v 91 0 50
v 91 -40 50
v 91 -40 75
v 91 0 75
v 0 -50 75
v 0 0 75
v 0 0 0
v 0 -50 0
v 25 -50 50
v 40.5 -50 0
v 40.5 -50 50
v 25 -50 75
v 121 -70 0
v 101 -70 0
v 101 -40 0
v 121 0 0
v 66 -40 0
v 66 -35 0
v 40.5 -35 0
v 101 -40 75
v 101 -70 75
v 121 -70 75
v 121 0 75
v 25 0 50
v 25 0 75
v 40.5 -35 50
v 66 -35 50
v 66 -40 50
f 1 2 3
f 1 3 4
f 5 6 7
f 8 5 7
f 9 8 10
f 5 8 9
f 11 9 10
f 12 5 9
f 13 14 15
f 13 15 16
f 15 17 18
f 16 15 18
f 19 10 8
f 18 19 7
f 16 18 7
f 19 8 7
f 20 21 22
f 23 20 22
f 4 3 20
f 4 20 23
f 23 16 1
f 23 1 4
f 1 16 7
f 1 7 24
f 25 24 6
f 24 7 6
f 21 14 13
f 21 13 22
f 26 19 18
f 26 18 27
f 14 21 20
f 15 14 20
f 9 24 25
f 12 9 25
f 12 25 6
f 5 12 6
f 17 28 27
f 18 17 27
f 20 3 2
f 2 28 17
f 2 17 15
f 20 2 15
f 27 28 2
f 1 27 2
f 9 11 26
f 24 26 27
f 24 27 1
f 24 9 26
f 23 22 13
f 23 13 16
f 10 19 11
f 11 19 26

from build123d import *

# Parameters (mm, degrees)
F1_DEPTH = 50
F2_W     = 35
F2_H     = 50
F3_DEPTH = 25.5
F4_W     = 40
F4_H     = 50
F5_DEPTH = 35
F6_W     = 10
F6_H     = 40
F7_DEPTH = 25
F8_W     = 70
F8_H     = 75
F9_DEPTH = 20


with BuildPart() as f1:
    # F0 (on Front) → F1 (new body)
    with BuildSketch(Plane.XZ):
        Polygon((0, 75), (0, 0), (40.5, 0), (40.5, 50), (25, 50), (25, 75), align=None)
    extrude(amount=F1_DEPTH)

    # F2 (on face) → F3 (join)
    with BuildSketch(Plane.YZ.offset(40.5)):
        with Locations((-17.5, 25)):
            Rectangle(F2_W, F2_H)
    extrude(amount=F3_DEPTH)

    # F4 (on face) → F5 (join)
    with BuildSketch(Plane.YZ.offset(66)):
        with Locations((-20, 25)):
            Rectangle(F4_W, F4_H)
    extrude(amount=F5_DEPTH)

    # F6 (on face) → F7 (join)
    with BuildSketch(Plane.XY.offset(50)):
        with Locations((96, -20)):
            Rectangle(F6_W, F6_H)
    extrude(amount=F7_DEPTH)

    # F8 (on face) → F9 (join)
    with BuildSketch(Plane.YZ.offset(101)):
        with Locations((-35, 37.5)):
            Rectangle(F8_W, F8_H)
    extrude(amount=F9_DEPTH)


solid = f1.part
